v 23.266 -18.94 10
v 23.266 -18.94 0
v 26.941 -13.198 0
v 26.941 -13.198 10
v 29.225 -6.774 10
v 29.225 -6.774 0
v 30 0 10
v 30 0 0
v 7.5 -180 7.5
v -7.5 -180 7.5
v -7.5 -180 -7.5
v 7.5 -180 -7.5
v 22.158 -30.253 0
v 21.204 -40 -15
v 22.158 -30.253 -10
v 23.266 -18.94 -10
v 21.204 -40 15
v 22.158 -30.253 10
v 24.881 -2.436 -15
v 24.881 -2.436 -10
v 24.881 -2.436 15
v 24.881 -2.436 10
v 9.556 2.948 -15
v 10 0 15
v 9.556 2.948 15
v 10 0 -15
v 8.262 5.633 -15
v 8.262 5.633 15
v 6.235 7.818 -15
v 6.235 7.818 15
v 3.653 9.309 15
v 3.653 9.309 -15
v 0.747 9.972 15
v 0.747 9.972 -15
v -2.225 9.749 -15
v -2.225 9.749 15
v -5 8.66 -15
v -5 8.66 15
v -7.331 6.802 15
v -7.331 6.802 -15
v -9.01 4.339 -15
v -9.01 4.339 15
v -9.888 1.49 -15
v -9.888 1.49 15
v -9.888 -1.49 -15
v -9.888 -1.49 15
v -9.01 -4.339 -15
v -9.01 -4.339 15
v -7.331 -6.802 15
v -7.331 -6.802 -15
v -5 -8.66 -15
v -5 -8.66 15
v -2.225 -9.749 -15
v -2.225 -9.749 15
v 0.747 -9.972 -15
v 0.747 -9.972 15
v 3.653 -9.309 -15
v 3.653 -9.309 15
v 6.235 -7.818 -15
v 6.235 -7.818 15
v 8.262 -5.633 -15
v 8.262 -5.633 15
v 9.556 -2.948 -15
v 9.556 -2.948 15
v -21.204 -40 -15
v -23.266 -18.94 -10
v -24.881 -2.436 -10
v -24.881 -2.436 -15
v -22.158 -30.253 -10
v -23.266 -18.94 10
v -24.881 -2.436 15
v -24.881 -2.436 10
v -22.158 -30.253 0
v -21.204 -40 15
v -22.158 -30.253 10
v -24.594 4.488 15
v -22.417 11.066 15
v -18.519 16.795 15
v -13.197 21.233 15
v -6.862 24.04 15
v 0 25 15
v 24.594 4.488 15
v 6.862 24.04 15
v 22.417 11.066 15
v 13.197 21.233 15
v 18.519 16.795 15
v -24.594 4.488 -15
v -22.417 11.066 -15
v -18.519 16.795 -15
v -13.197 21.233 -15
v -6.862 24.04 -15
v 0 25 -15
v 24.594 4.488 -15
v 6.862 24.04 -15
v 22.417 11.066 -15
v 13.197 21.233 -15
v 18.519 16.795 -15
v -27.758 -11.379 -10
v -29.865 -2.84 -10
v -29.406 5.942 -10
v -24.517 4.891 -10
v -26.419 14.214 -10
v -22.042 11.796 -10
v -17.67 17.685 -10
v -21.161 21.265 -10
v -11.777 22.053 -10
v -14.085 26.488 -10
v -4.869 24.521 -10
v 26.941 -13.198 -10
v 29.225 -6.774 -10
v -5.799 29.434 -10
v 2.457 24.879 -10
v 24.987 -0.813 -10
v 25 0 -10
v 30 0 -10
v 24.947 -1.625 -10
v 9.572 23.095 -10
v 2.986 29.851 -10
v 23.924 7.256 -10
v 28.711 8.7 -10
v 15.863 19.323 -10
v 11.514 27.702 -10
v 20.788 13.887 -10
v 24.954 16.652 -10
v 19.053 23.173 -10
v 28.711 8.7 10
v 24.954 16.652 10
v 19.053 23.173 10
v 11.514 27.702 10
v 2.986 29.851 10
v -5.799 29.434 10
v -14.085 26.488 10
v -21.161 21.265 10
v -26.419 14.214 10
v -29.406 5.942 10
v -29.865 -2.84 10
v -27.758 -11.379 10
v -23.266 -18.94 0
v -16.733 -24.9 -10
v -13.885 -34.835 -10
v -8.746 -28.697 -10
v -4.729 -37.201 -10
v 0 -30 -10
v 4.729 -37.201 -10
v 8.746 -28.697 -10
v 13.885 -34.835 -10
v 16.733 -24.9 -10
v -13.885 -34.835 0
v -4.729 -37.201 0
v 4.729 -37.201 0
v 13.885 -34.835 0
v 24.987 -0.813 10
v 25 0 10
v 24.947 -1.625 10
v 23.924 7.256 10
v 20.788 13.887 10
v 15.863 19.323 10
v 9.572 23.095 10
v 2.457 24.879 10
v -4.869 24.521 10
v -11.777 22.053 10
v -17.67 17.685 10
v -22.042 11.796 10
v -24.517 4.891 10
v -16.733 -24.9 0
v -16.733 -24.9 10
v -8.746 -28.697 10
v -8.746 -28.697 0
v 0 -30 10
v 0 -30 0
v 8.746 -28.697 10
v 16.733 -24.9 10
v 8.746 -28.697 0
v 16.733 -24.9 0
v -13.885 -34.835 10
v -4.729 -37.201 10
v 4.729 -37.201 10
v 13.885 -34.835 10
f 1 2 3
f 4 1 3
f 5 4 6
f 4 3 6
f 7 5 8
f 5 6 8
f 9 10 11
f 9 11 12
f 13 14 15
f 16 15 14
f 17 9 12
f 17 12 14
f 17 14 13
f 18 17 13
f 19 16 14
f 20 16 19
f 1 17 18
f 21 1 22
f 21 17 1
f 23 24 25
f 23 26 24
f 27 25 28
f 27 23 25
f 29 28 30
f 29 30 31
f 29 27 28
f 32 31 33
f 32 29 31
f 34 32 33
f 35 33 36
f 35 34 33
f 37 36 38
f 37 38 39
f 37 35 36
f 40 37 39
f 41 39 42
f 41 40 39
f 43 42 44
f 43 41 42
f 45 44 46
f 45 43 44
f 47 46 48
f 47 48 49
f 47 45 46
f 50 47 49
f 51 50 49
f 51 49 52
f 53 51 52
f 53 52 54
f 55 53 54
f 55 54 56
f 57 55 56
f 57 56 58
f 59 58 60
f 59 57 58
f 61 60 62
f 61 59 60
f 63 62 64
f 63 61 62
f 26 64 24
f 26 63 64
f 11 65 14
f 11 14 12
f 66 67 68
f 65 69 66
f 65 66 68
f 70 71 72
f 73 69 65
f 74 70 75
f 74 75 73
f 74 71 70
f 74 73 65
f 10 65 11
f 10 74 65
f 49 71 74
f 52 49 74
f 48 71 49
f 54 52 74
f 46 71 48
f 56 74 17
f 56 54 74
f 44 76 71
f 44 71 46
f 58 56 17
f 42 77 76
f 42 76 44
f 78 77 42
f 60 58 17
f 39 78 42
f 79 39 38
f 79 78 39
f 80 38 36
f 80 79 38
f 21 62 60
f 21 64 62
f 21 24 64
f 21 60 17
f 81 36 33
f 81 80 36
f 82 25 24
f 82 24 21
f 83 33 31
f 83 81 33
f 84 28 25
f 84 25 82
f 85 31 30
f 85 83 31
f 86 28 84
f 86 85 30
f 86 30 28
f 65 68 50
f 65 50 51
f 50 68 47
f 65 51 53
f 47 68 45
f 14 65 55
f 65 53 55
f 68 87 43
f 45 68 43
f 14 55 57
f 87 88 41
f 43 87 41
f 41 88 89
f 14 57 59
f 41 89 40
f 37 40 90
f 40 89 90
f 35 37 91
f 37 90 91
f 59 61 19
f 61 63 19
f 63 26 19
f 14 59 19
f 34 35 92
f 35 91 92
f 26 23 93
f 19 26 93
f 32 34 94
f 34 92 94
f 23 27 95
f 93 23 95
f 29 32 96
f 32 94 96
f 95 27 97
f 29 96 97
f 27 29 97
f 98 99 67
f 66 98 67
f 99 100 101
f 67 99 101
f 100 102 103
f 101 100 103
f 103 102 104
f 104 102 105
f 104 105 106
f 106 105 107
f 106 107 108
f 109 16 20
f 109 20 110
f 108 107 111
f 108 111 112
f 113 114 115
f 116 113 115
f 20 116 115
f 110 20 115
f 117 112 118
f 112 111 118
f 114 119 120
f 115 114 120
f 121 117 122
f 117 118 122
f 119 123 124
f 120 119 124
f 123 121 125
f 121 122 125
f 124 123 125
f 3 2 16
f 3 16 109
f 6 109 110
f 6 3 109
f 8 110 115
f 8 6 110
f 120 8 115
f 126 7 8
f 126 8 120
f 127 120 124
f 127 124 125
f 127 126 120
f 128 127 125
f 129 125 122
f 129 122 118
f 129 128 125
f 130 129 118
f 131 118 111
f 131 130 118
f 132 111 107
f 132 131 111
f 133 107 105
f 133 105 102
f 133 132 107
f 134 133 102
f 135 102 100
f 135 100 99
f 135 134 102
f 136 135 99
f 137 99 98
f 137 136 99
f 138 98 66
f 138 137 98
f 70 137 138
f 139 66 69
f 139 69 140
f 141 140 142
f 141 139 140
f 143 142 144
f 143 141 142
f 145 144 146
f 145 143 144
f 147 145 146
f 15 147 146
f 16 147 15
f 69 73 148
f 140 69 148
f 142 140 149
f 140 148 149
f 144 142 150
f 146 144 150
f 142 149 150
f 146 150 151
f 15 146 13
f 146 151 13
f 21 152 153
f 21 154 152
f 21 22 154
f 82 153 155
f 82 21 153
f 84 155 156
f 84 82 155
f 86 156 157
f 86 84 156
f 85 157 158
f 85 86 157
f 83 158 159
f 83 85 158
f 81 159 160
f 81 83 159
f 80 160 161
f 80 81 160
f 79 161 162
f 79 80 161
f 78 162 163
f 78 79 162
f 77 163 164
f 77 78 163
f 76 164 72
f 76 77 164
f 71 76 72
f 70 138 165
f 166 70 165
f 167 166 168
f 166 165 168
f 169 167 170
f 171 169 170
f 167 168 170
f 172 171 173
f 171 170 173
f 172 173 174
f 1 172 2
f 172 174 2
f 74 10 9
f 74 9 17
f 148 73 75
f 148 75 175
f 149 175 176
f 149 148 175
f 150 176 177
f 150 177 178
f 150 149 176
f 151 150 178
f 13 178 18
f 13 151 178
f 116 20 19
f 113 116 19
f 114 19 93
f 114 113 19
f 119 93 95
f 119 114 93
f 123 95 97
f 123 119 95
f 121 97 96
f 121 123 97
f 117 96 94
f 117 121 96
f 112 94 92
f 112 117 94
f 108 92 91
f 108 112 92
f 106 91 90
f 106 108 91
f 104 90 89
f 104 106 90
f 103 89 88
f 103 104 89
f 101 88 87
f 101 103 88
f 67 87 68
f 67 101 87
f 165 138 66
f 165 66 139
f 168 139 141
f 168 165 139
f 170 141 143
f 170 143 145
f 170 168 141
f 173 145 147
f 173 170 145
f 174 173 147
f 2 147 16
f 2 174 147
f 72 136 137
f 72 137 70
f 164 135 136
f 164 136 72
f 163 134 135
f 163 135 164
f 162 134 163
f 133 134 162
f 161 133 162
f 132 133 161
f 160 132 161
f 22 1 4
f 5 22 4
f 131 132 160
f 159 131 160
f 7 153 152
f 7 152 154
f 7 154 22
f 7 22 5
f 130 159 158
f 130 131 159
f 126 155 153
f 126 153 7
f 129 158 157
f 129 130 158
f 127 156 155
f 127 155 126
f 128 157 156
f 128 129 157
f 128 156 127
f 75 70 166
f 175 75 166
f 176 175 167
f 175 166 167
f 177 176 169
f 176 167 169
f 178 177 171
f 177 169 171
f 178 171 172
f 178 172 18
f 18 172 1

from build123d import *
from build123d.topology import SkipClean

# Parameters (mm, degrees)
SKETCH1_R               = 10
BOSS_EXTRUDE1_DEPTH     = 15
CUT_EXTRUDE1_DEPTH      = 10
SKETCH1_5_R             = 30
SKETCH1_5_R_2           = 25
BOSS_EXTRUDE2_DEPTH     = 10
CUT_EXTRUDE2_DEPTH      = 184.098334236
CUT_EXTRUDE2_DEPTH_BACK = 184.098334236


with BuildPart() as part:
    # Sketch1 → Boss-Extrude1 (new, symmetric)
    with BuildSketch(Plane.XY):
        with BuildLine():
            ThreePointArc((24.881082953, -2.435510432), (0, 25), (-24.881082953, -2.435510432))
            Line((-24.881082953, -2.435510432), (-7.5, -180))
            Line((-7.5, -180), (7.5, -180))
            Line((7.5, -180), (24.881082953, -2.435510432))
        make_face()
        Circle(SKETCH1_R, mode=Mode.SUBTRACT)
    extrude(amount=BOSS_EXTRUDE1_DEPTH, both=True)

    # Sketch1<4> → Cut-Extrude1 (cut, symmetric)
    with SkipClean():  # the faces are left unmerged after this step: merging them gives an invalid solid
        with BuildSketch(Plane.XY):
            with BuildLine():
                ThreePointArc((24.881082953, -2.435510432), (0, -25), (-24.881082953, -2.435510432))
                Line((-24.881082953, -2.435510432), (-22.15809951, -30.253406851))
                ThreePointArc((-22.15809951, -30.253406851), (0, -37.5), (22.15809951, -30.253406851))
                Line((22.15809951, -30.253406851), (24.881082953, -2.435510432))
            make_face()
        extrude(amount=CUT_EXTRUDE1_DEPTH, both=True, mode=Mode.SUBTRACT)

    # Sketch1<5> → Boss-Extrude2 (add, symmetric)
    with BuildSketch(Plane.XY):
        Circle(SKETCH1_5_R)
        Circle(SKETCH1_5_R_2, mode=Mode.SUBTRACT)
    extrude(amount=BOSS_EXTRUDE2_DEPTH, both=True)

    # Sketch3 → Cut-Extrude2 (cut, two sides: drawn at the far end of the back side and taken through both)
    with BuildSketch(Plane(origin=(0, 0, 0), x_dir=(0, 0, -1), z_dir=(1, 0, 0)).offset(-CUT_EXTRUDE2_DEPTH_BACK)):
        Polygon((-15, -180), (-7.5, -180), (-15, -40), align=None)
        Polygon((15, -40), (7.5, -180), (15, -180), align=None)
    extrude(amount=CUT_EXTRUDE2_DEPTH + CUT_EXTRUDE2_DEPTH_BACK, mode=Mode.SUBTRACT)


solid = part.part
